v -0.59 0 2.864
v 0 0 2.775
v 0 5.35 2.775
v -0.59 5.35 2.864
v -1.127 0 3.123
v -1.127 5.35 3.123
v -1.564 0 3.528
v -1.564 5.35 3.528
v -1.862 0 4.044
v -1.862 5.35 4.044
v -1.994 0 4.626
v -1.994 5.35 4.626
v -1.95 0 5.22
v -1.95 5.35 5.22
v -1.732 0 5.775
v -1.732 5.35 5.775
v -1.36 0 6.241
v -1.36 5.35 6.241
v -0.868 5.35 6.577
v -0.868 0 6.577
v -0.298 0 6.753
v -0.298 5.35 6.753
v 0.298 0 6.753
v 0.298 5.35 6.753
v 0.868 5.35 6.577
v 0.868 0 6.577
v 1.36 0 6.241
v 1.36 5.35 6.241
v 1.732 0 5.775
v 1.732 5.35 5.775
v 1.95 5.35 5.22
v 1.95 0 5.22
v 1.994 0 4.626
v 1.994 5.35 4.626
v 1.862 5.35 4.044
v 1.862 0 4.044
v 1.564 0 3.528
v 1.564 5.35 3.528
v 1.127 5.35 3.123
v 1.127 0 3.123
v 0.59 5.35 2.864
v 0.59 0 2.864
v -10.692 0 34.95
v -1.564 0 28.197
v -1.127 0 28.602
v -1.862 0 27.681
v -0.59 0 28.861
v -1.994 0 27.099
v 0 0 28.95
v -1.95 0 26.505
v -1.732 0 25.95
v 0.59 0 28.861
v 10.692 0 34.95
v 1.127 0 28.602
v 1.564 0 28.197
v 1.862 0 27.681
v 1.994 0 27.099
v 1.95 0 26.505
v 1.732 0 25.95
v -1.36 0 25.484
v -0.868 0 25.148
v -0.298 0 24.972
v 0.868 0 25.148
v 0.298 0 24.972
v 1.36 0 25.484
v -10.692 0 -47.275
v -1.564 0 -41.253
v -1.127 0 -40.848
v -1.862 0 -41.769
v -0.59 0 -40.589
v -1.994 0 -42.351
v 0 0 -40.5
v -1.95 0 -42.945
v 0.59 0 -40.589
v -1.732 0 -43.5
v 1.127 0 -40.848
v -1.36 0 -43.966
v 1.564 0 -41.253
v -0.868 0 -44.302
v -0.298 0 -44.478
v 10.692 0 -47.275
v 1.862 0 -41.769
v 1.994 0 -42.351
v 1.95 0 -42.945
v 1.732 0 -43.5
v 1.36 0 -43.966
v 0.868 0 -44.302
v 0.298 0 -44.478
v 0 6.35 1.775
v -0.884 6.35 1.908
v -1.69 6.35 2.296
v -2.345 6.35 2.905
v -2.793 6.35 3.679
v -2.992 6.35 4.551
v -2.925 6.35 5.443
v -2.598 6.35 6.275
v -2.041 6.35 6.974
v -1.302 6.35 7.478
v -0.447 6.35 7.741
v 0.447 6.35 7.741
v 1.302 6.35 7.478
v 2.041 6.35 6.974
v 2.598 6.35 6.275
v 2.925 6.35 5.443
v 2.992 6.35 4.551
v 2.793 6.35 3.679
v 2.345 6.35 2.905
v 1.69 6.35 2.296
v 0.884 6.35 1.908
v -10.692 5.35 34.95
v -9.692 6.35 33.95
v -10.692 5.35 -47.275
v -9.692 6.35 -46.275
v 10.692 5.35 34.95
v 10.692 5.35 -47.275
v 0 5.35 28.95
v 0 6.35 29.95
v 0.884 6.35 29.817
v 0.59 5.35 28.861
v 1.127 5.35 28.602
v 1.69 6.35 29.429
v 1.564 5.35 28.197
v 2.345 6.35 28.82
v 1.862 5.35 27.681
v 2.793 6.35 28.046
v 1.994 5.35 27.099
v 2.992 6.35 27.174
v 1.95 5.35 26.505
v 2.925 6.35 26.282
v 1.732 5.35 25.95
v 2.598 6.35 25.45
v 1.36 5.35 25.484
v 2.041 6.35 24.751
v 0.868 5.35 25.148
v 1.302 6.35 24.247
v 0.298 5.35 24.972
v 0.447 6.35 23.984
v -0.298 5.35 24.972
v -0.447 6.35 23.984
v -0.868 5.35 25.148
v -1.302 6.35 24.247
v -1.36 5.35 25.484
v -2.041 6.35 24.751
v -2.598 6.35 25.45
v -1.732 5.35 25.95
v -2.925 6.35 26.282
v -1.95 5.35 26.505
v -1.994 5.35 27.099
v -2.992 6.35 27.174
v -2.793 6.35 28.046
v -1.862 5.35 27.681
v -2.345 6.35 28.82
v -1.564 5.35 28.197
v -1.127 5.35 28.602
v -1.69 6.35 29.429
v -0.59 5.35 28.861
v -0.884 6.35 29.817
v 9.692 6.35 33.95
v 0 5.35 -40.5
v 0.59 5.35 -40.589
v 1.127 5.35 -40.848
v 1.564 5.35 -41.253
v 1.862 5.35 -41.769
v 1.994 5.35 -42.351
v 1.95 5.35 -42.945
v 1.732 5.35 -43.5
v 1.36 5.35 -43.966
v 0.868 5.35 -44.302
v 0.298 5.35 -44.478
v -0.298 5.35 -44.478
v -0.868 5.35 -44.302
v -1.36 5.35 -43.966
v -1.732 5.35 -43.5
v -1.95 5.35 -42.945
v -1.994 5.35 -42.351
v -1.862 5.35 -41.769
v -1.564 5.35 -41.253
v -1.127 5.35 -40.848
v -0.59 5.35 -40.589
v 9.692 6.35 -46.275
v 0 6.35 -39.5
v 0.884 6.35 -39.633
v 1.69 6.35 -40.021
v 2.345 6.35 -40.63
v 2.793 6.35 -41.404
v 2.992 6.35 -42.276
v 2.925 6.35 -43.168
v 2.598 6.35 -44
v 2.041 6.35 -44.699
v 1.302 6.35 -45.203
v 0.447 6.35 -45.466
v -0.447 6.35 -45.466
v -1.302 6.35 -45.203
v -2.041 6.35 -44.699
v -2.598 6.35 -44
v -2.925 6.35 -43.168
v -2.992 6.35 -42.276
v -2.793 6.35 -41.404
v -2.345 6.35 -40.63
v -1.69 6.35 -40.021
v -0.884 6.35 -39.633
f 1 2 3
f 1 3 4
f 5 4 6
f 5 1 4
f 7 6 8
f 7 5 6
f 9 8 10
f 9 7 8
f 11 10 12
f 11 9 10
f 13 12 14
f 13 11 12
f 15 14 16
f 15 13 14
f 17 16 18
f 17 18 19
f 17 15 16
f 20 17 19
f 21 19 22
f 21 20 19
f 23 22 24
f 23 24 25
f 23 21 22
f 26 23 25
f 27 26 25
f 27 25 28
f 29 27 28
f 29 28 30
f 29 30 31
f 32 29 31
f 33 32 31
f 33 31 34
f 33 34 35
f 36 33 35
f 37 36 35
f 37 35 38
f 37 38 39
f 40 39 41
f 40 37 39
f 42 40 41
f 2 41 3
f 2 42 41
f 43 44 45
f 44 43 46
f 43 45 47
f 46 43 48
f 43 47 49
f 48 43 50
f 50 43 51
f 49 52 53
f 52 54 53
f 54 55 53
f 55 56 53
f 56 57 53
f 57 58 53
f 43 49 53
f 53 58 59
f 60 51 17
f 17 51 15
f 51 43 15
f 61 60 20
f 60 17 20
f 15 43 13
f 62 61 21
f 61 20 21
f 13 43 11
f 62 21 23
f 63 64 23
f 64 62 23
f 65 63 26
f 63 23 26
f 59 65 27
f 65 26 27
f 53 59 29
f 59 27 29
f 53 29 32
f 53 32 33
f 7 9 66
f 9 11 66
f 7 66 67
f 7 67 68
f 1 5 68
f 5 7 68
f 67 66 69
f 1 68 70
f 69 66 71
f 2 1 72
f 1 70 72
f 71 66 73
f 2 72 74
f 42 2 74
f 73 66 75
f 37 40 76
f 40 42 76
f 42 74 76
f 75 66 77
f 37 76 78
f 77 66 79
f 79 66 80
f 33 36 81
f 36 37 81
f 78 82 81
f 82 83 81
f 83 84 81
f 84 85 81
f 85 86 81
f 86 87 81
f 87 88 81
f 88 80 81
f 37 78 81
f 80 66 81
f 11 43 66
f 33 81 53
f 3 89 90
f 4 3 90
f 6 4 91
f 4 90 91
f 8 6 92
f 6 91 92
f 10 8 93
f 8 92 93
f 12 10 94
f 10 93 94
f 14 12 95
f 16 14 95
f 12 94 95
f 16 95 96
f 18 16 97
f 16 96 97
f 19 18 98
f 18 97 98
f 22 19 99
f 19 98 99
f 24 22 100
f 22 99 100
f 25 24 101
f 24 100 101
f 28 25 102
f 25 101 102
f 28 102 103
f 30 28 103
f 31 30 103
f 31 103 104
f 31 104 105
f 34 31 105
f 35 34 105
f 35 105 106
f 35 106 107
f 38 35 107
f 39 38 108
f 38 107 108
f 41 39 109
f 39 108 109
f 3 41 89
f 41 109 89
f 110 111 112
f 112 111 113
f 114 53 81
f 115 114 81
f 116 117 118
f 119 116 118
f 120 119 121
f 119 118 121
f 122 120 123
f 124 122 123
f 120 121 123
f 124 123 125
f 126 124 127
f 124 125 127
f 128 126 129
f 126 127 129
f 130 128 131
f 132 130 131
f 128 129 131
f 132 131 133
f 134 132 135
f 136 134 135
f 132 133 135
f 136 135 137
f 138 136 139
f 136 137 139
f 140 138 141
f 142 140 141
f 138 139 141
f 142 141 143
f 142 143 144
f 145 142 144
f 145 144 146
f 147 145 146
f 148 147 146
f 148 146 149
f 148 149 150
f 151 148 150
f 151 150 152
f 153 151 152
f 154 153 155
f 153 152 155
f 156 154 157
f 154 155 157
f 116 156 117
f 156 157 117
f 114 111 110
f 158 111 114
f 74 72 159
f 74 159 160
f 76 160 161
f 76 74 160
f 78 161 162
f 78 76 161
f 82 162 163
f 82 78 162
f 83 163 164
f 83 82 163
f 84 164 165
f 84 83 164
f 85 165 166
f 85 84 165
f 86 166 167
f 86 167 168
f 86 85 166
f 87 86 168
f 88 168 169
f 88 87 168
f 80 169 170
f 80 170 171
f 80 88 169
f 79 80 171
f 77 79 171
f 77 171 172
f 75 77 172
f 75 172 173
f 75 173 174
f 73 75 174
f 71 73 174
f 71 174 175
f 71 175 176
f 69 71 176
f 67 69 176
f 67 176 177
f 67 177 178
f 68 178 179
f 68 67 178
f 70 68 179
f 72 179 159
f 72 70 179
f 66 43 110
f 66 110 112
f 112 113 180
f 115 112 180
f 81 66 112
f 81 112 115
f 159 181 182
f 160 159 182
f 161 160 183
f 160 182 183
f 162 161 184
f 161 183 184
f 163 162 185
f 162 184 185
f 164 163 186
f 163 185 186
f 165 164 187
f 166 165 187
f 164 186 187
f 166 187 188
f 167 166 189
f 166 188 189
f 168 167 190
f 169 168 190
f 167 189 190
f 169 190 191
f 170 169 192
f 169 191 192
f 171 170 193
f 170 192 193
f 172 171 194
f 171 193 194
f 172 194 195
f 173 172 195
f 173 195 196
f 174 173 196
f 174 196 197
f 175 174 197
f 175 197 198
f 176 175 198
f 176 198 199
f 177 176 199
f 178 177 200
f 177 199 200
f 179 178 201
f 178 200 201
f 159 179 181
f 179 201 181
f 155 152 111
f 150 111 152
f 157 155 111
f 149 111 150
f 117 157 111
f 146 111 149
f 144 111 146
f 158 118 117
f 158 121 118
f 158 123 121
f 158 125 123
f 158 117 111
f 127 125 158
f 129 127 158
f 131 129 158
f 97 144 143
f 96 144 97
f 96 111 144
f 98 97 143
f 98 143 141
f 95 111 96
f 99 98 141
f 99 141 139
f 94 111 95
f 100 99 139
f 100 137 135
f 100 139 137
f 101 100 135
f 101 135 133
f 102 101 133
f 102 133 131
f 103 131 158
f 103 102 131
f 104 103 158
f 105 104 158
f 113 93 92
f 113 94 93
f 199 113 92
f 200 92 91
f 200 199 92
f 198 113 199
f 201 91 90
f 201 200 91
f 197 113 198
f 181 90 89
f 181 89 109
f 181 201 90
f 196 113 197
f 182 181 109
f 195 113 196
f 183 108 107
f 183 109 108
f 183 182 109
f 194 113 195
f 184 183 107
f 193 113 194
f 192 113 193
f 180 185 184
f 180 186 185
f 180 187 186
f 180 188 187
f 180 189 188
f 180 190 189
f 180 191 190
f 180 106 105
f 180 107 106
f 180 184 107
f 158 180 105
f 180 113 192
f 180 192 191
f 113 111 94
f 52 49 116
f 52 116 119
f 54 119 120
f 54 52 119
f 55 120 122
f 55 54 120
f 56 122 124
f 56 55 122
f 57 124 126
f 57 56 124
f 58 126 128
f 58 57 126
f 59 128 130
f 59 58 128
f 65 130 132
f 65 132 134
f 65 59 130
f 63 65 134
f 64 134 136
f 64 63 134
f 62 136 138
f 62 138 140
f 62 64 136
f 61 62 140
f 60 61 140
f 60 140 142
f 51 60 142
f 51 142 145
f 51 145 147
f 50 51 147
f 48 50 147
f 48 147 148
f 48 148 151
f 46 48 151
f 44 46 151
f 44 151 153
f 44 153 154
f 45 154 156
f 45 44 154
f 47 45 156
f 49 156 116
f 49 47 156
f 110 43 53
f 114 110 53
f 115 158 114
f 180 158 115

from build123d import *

# Parameters (mm, degrees)
SKETCH1_W           = 21.384482042
SKETCH1_H           = 82.225
SKETCH1_R           = 2
BOSS_EXTRUDE1_DEPTH = 6.35
CHAMFER1_SIZE       = 1


with BuildPart() as part:
    # Sketch1 → Boss-Extrude1 (new body)
    with BuildSketch(Plane(origin=(0, 0, 0), x_dir=(1, 0, 0), z_dir=(0, 1, 0))):
        with Locations((0, 6.1625)):
            Rectangle(SKETCH1_W, SKETCH1_H)
        with Locations(Location((0, 42.5, 0), (0, 0, 270))):
            Circle(SKETCH1_R, mode=Mode.SUBTRACT)
        with Locations(Location((0, -4.775, 0), (0, 0, 90))):
            Circle(SKETCH1_R, mode=Mode.SUBTRACT)
        with Locations(Location((0, -26.95, 0), (0, 0, 270))):
            Circle(SKETCH1_R, mode=Mode.SUBTRACT)
    extrude(amount=BOSS_EXTRUDE1_DEPTH)

    # Chamfer1
    chamfer1_edges = [part.edges().sort_by_distance(p)[0] for p in [
        (0, 6.35, -44.5),
        (0, 6.35, 34.95),
        (0, 6.35, 6.775),
        (10.692241021, 6.35, -6.1625),
        (0, 6.35, 24.95),
        (0, 6.35, -47.275),
        (-10.692241021, 6.35, -6.1625),
    ]]
    chamfer(chamfer1_edges, length=CHAMFER1_SIZE)


solid = part.part
